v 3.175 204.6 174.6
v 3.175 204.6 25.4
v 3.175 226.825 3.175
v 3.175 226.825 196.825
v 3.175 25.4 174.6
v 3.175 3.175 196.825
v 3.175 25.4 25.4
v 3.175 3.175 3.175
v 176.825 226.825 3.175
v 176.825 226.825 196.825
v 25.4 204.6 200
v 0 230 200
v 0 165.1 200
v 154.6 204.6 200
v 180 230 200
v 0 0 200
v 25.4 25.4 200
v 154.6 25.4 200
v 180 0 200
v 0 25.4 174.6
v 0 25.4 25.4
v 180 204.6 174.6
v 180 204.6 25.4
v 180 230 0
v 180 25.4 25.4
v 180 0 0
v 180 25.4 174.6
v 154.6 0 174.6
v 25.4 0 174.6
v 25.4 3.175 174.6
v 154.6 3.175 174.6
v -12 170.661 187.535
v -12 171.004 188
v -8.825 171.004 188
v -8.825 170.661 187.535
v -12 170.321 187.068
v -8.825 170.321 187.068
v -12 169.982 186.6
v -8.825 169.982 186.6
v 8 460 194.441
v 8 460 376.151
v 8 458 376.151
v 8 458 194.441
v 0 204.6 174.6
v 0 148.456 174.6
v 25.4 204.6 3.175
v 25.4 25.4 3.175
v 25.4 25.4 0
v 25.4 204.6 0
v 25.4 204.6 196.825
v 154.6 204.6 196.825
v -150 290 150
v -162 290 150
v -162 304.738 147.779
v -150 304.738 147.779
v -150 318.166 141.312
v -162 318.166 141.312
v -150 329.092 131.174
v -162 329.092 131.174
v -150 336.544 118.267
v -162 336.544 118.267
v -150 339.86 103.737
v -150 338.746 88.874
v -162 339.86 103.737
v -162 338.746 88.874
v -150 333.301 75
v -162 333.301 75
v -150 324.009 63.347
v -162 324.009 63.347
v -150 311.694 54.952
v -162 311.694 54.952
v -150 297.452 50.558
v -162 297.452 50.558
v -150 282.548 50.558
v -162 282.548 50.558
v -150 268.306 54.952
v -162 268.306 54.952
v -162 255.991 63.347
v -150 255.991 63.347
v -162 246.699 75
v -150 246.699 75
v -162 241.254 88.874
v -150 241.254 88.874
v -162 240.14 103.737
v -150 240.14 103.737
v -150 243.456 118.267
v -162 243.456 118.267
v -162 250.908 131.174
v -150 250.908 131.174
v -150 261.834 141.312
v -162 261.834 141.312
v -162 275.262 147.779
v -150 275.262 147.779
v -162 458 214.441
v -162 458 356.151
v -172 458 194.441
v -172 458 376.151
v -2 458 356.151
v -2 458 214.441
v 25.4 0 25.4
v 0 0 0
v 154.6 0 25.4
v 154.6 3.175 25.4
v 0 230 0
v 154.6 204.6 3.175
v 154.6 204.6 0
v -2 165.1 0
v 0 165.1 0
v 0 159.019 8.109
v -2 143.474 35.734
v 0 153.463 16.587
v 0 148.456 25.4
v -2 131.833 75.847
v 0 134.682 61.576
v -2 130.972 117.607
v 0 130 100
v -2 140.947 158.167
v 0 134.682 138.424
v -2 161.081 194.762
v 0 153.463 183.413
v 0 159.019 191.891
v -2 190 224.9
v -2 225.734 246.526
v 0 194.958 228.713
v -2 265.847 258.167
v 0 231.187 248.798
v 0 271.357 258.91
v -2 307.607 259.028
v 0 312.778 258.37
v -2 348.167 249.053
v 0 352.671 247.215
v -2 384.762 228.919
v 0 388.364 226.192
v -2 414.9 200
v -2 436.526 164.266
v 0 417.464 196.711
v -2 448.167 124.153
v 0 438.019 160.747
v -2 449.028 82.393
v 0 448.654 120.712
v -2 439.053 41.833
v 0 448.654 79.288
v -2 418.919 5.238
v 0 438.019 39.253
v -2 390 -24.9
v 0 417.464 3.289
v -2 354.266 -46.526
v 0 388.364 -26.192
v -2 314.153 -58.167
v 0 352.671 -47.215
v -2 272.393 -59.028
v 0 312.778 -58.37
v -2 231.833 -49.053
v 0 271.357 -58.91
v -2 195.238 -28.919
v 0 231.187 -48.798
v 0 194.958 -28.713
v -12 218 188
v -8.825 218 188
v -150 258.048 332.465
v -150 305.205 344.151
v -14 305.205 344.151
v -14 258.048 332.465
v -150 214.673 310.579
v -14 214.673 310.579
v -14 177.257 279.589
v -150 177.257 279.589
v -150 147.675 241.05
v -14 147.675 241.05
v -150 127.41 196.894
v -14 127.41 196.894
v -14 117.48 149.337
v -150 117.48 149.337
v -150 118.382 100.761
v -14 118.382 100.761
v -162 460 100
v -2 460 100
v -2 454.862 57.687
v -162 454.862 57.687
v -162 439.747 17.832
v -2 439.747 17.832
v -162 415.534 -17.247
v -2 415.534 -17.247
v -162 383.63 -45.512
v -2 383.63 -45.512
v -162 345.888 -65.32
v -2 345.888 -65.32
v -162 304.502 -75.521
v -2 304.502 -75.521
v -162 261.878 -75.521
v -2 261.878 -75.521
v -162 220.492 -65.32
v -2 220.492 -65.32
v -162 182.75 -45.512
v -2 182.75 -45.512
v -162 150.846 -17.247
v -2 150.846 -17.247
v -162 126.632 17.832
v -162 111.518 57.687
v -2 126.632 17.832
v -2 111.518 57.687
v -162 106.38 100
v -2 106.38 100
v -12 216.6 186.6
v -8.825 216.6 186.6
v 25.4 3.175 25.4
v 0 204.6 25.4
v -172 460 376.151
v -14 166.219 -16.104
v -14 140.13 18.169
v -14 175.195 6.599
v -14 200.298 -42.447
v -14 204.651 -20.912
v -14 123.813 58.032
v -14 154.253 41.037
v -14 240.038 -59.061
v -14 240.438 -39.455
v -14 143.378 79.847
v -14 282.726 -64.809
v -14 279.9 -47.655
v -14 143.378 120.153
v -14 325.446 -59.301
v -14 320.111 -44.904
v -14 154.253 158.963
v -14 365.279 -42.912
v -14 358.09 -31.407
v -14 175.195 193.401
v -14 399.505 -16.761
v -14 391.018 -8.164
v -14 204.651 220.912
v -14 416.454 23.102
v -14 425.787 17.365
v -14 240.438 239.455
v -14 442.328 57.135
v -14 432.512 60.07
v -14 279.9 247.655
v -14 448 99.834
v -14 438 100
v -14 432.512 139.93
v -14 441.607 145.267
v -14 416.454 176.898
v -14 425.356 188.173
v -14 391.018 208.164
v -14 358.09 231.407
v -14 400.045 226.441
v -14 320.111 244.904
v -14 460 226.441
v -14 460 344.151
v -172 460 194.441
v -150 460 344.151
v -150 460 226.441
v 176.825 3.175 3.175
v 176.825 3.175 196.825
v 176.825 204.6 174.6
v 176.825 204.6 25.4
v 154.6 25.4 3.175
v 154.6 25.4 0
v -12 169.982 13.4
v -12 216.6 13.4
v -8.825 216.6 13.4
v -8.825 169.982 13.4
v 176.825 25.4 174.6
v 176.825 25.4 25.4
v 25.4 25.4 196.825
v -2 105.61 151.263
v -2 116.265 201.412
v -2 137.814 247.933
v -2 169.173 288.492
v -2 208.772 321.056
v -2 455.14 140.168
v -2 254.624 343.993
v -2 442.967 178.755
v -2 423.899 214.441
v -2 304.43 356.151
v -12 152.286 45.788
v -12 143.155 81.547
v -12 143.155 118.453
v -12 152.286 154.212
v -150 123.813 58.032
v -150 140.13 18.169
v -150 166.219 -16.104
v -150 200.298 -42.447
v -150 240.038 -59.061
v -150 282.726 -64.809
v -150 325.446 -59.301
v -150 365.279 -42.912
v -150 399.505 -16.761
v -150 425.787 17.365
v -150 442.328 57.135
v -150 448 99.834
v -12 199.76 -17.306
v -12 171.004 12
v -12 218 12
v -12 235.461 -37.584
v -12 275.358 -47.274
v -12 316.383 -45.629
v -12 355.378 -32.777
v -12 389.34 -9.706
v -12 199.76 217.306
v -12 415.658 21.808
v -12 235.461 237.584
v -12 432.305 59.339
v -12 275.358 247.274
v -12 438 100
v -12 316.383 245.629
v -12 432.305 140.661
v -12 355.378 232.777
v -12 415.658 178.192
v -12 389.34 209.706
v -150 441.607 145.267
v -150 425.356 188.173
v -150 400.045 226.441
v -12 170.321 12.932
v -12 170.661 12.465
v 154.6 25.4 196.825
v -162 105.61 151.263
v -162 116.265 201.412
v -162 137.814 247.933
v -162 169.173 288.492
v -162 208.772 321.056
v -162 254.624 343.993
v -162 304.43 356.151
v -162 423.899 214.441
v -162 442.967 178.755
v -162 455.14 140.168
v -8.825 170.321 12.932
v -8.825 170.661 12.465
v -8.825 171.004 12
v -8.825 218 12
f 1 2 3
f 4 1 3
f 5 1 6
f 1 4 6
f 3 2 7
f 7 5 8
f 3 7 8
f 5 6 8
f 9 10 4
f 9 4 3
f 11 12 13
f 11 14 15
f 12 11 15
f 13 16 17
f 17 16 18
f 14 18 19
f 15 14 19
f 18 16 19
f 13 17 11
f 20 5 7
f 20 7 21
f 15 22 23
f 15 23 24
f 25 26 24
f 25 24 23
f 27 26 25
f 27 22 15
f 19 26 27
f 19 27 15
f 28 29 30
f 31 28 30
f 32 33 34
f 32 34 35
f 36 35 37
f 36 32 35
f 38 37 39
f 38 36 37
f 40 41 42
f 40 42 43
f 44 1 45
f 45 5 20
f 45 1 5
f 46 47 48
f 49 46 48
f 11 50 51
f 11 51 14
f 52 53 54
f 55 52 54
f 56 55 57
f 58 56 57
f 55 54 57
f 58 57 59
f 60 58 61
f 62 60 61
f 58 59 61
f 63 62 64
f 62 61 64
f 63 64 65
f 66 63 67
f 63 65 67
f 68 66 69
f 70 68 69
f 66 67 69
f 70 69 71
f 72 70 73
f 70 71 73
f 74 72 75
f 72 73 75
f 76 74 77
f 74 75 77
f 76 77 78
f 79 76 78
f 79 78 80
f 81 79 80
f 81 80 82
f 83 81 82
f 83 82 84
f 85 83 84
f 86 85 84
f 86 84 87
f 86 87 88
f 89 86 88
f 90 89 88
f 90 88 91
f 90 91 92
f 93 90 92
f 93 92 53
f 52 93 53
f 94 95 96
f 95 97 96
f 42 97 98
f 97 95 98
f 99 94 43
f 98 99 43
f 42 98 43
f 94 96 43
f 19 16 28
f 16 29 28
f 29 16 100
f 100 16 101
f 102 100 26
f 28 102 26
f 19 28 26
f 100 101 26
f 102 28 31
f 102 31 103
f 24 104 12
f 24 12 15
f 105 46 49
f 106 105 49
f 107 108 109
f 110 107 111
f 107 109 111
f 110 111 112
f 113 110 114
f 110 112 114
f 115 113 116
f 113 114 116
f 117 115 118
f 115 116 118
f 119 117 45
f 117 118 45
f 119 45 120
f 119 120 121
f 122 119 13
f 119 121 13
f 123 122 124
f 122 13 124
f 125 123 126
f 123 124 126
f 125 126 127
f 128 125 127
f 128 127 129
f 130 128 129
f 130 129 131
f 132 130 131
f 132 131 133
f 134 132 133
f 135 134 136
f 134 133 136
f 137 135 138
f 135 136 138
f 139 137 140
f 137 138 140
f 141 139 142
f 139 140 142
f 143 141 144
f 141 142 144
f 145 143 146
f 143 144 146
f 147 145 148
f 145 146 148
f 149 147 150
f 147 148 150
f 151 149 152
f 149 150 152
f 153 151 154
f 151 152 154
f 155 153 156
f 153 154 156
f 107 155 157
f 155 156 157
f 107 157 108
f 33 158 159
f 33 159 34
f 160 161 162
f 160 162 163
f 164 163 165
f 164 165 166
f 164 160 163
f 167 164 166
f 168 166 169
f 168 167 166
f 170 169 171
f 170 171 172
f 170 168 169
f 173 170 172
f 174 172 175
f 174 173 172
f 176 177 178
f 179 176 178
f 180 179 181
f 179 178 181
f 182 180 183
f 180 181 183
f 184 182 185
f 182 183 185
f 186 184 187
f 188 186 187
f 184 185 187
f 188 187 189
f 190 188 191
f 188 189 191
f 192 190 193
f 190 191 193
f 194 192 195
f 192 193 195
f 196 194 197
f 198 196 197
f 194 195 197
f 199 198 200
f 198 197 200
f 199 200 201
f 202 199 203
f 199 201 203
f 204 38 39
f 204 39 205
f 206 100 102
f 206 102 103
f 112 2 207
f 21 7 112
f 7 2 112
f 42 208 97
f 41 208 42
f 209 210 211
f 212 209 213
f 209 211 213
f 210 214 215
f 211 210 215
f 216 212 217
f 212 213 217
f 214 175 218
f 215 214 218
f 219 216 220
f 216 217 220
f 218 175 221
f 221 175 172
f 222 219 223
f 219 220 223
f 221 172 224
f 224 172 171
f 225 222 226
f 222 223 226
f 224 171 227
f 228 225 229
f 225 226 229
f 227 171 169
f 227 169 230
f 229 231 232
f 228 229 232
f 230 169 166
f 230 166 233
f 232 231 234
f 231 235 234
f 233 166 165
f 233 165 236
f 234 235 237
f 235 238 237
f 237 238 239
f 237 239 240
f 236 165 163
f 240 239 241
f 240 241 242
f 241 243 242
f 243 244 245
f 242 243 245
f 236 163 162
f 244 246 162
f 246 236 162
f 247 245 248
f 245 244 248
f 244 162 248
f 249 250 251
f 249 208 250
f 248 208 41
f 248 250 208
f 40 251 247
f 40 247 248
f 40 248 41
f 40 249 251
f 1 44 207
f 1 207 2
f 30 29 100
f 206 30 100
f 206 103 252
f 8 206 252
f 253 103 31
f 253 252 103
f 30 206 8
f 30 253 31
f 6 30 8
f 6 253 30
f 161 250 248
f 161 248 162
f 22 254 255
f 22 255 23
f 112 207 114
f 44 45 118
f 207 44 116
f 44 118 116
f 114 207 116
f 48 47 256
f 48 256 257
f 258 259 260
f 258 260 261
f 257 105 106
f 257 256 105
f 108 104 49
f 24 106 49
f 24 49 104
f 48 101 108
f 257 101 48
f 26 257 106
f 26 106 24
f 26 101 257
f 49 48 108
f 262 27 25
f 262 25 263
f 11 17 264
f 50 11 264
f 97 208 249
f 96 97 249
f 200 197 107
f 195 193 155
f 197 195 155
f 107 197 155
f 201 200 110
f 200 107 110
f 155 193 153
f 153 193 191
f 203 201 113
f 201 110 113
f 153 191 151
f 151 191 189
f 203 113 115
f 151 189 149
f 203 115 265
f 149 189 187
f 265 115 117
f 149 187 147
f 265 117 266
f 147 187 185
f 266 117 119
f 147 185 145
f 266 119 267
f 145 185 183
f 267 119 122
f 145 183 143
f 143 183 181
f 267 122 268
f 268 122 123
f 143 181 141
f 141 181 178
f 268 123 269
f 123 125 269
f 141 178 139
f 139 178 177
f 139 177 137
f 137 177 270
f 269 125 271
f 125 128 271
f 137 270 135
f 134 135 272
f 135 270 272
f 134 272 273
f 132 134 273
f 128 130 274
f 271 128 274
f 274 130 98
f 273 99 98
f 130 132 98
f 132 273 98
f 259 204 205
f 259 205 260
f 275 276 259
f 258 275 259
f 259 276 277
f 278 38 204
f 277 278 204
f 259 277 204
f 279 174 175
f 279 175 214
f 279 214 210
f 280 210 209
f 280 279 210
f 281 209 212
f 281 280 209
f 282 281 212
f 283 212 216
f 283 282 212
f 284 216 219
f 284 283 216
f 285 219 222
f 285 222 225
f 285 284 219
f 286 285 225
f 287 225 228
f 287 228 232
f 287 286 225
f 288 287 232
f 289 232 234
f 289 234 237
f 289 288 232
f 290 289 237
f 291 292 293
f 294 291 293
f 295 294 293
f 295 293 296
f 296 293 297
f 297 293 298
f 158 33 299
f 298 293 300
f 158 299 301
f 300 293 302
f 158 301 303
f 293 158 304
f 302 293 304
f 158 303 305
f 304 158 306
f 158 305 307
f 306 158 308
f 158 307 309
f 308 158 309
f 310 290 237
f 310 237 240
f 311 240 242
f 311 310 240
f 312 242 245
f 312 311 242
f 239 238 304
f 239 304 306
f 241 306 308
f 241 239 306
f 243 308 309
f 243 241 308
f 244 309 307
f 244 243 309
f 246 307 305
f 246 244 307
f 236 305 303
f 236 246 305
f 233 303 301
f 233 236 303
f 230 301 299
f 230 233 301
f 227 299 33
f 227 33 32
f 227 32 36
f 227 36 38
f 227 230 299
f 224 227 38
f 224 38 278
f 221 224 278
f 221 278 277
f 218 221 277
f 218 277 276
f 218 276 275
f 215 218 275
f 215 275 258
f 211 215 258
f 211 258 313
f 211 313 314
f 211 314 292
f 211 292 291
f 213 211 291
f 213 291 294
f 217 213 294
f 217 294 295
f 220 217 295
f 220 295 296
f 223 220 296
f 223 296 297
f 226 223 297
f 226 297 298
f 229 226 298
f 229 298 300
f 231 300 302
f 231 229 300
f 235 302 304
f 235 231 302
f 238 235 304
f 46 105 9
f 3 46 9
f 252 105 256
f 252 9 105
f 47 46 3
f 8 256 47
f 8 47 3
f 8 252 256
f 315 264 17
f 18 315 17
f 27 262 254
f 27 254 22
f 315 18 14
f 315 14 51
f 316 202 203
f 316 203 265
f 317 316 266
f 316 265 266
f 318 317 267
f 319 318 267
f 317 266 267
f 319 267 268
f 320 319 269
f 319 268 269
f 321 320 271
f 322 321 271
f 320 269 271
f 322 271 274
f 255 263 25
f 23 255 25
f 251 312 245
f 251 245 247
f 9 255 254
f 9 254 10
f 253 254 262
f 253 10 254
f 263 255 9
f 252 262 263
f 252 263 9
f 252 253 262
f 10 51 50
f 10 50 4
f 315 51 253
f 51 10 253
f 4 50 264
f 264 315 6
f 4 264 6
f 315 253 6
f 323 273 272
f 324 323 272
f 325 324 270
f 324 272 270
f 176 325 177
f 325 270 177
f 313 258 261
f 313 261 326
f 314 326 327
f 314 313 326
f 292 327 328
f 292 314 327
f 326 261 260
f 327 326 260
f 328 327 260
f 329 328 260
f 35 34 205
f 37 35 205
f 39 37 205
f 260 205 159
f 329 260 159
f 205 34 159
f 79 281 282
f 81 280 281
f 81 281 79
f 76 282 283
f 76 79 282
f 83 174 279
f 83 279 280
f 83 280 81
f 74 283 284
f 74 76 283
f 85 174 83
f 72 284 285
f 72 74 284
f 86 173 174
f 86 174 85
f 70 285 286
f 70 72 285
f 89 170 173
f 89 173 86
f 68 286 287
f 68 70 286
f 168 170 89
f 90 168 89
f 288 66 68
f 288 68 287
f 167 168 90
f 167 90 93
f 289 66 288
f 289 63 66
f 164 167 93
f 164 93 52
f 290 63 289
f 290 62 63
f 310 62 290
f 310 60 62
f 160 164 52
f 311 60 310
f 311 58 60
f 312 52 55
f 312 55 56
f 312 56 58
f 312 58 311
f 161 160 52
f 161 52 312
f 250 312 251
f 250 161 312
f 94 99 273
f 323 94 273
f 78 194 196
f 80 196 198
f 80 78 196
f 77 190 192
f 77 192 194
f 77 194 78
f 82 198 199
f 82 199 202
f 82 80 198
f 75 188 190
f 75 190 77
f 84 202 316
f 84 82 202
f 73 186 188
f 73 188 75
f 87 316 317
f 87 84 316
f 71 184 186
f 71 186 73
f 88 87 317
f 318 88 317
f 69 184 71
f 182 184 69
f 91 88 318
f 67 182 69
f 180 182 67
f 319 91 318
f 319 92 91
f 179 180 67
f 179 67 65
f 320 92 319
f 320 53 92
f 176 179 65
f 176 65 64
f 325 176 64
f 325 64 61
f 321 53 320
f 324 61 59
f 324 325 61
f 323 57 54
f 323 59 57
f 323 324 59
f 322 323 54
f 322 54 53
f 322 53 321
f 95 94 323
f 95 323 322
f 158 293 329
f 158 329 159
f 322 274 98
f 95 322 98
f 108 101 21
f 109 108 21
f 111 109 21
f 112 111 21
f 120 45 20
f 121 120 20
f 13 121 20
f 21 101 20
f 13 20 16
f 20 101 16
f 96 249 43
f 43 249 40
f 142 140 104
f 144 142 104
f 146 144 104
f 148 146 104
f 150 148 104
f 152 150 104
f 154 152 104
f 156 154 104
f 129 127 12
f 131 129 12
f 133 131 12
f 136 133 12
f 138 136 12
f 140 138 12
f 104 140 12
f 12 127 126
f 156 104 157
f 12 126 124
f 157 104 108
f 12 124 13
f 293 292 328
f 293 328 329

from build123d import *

# Parameters (mm, degrees)
SALIENTE_EXTRUIR1_DEPTH   = 230
SALIENTE_EXTRUIR1_2_DEPTH = 230
SALIENTE_EXTRUIR1_3_DEPTH = 230
SALIENTE_EXTRUIR1_4_DEPTH = 230
SALIENTE_EXTRUIR2_REACH   = 355.977
SALIENTE_EXTRUIR3_DEPTH   = 180
CROQUIS4_W                = 149.2
CROQUIS4_H                = 3.175
SALIENTE_EXTRUIR4_DEPTH   = 154.6
CROQUIS5_R                = 160
SALIENTE_EXTRUIR5_DEPTH   = 2
SALIENTE_EXTRUIR6_DEPTH   = 160
CROQUIS7_W                = 180
CROQUIS7_H                = 181.710341205
SALIENTE_EXTRUIR7_DEPTH   = 2
VACIADO1_START            = -150
VACIADO1_DEPTH            = 136
VACIADO1_START_2          = -14
VACIADO1_2_OUTLINE_R      = 148
VACIADO1_2_DEPTH          = 2
VACIADO1_START_3          = -12
VACIADO1_3_DEPTH          = 3.175
CROQUIS8_R                = 50
CORTAR_EXTRUIR1_DEPTH     = 14


# Read off the part's stored shape, not the designer's step: Vaciado1
with BuildPart() as part:
    # Croquis1 → Saliente-Extruir1 (new body)
    with BuildSketch(Plane(origin=(0, 0, 0), x_dir=(1, 0, 0), z_dir=(0, 1, 0))):
        Polygon((0, 0), (25.4, 0), (25.4, -3.175), (3.175, -3.175), (3.175, -25.4), (0, -25.4), align=None)
    extrude(amount=SALIENTE_EXTRUIR1_DEPTH)

    # Saliente-Extruir2: up to this face of the body (flat: up to its plane)
    saliente_extruir2_end = Plane(part.part.faces().sort_by_distance((12.7, 115, 0))[0])
    # Croquis2 → Saliente-Extruir2 (add, up to the picked face)
    with BuildSketch(Plane.XY.offset(200), mode=Mode.PRIVATE) as saliente_extruir2_sk1:
        Polygon((25.4, 230), (0, 230), (0, 204.6), (3.175, 204.6), (3.175, 226.825), (25.4, 226.825), align=None)
    saliente_extruir2_tool1 = split(extrude(saliente_extruir2_sk1.sketch, amount=-SALIENTE_EXTRUIR2_REACH, mode=Mode.PRIVATE), bisect_by=saliente_extruir2_end, keep=Keep.BOTH, mode=Mode.PRIVATE)
    # Croquis2 → Saliente-Extruir2 (add, up to the picked face)
    with BuildSketch(Plane.XY.offset(200), mode=Mode.PRIVATE) as saliente_extruir2_sk2:
        Polygon((176.825, 204.6), (180, 204.6), (180, 230), (154.6, 230), (154.6, 226.825), (176.825, 226.825), align=None)
    saliente_extruir2_tool2 = split(extrude(saliente_extruir2_sk2.sketch, amount=-SALIENTE_EXTRUIR2_REACH, mode=Mode.PRIVATE), bisect_by=saliente_extruir2_end, keep=Keep.BOTH, mode=Mode.PRIVATE)
    # Croquis2 → Saliente-Extruir2 (add, up to the picked face)
    with BuildSketch(Plane.XY.offset(200), mode=Mode.PRIVATE) as saliente_extruir2_sk3:
        Polygon((154.6, 0), (180, 0), (180, 25.4), (176.825, 25.4), (176.825, 3.175), (154.6, 3.175), align=None)
    saliente_extruir2_tool3 = split(extrude(saliente_extruir2_sk3.sketch, amount=-SALIENTE_EXTRUIR2_REACH, mode=Mode.PRIVATE), bisect_by=saliente_extruir2_end, keep=Keep.BOTH, mode=Mode.PRIVATE)
    # Croquis2 → Saliente-Extruir2 (add, up to the picked face)
    with BuildSketch(Plane.XY.offset(200), mode=Mode.PRIVATE) as saliente_extruir2_sk4:
        Polygon((3.175, 25.4), (0, 25.4), (0, 0), (25.4, 0), (25.4, 3.175), (3.175, 3.175), align=None)
    saliente_extruir2_tool4 = split(extrude(saliente_extruir2_sk4.sketch, amount=-SALIENTE_EXTRUIR2_REACH, mode=Mode.PRIVATE), bisect_by=saliente_extruir2_end, keep=Keep.BOTH, mode=Mode.PRIVATE)


with BuildPart() as body_2:
    # Croquis1 → Saliente-Extruir1 2 (new body)
    with BuildSketch(Plane(origin=(0, 0, 0), x_dir=(1, 0, 0), z_dir=(0, 1, 0))):
        Polygon((176.825, -25.4), (180, -25.4), (180, 0), (154.6, 0), (154.6, -3.175), (176.825, -3.175), align=None)
    extrude(amount=SALIENTE_EXTRUIR1_2_DEPTH)


with BuildPart() as body_3:
    # Croquis1 → Saliente-Extruir1 3 (new body)
    with BuildSketch(Plane(origin=(0, 0, 0), x_dir=(1, 0, 0), z_dir=(0, 1, 0))):
        Polygon((180, -200), (154.6, -200), (154.6, -196.825), (176.825, -196.825), (176.825, -174.6), (180, -174.6), align=None)
    extrude(amount=SALIENTE_EXTRUIR1_3_DEPTH)


with BuildPart() as body_4:
    # Croquis1 → Saliente-Extruir1 4 (new body)
    with BuildSketch(Plane(origin=(0, 0, 0), x_dir=(1, 0, 0), z_dir=(0, 1, 0))):
        Polygon((3.175, -174.6), (0, -174.6), (0, -200), (25.4, -200), (25.4, -196.825), (3.175, -196.825), align=None)
    extrude(amount=SALIENTE_EXTRUIR1_4_DEPTH)


with BuildPart() as part_1:
    add(part.part)

    add(body_2.part)  # Saliente-Extruir2 merges body 2

    add(body_3.part)  # Saliente-Extruir2 merges body 3

    add(body_4.part)  # Saliente-Extruir2 merges body 4
    add(saliente_extruir2_tool1.solids().sort_by(Axis((12.7, 229.64079, 200), (0, 0, -1)))[0])
    add(saliente_extruir2_tool2.solids().sort_by(Axis((178.4125, 204.95921, 200), (0, 0, -1)))[0])
    add(saliente_extruir2_tool3.solids().sort_by(Axis((167.3, 0.35921, 200), (0, 0, -1)))[0])
    add(saliente_extruir2_tool4.solids().sort_by(Axis((1.5875, 25.04079, 200), (0, 0, -1)))[0])

    # Croquis3 → Saliente-Extruir3 (add)
    with BuildSketch(Plane.ZY):
        Polygon((0, 0), (25.4, 0), (25.4, 3.175), (3.175, 3.175), (3.175, 25.4), (0, 25.4), align=None)
        Polygon((196.825, 25.4), (200, 25.4), (200, 0), (174.6, 0), (174.6, 3.175), (196.825, 3.175), align=None)
        Polygon((200, 230), (174.6, 230), (174.6, 226.825), (196.825, 226.825), (196.825, 204.6), (200, 204.6), align=None)
        Polygon((3.175, 204.6), (0, 204.6), (0, 230), (25.4, 230), (25.4, 226.825), (3.175, 226.825), align=None)
    extrude(amount=-SALIENTE_EXTRUIR3_DEPTH)

    # Croquis4 → Saliente-Extruir4 (add)
    with BuildSketch(Plane(origin=(180, 0, 0), x_dir=(0, 0, -1), z_dir=(1, 0, 0))):
        with Locations((-100, 228.4125)):
            Rectangle(CROQUIS4_W, CROQUIS4_H)
    extrude(amount=-SALIENTE_EXTRUIR4_DEPTH)

    # Croquis5 → Saliente-Extruir5 (add)
    with BuildSketch(Plane.ZY):
        with Locations(Location((100, 290, 0), (0, 0, 231.317812547))):
            Circle(CROQUIS5_R)
    extrude(amount=SALIENTE_EXTRUIR5_DEPTH)

    # Croquis6 → Saliente-Extruir6 (add)
    with BuildSketch(Plane.ZY.offset(2)):
        with BuildLine():
            Line((356.150943647, 460), (214.440602442, 460))
            Line((214.440602442, 460), (214.440602442, 423.899354359))
            ThreePointArc((214.440602442, 423.899354359), (159.743155313, 449.947233376), (100, 460))
            ThreePointArc((100, 460), (-76.81003198, 283.18996802), (100, 106.379936039))
            ThreePointArc((100, 106.379936039), (269.093013095, 152.354443037), (356.150943647, 304.430144907))
            Line((356.150943647, 304.430144907), (356.150943647, 460))
        make_face()
    extrude(amount=SALIENTE_EXTRUIR6_DEPTH)

    # Croquis7 → Saliente-Extruir7 (add)
    with BuildSketch(Plane(origin=(0, 460, 0), x_dir=(1, 0, 0), z_dir=(0, 1, 0))):
        with Locations((-82, -285.295773045)):
            Rectangle(CROQUIS7_W, CROQUIS7_H)
    extrude(amount=-SALIENTE_EXTRUIR7_DEPTH)

    # Vaciado1 outline → Vaciado1 (cut)
    with BuildSketch(Plane.YZ.offset(VACIADO1_START)):
        with BuildLine():
            Line((460, 344.150943647), (305.204872044, 344.150943647))
            ThreePointArc((305.204872044, 344.150943647), (161.38343221, 261.150196169), (118.381694611, 100.761352414))
            ThreePointArc((118.381694611, 100.761352414), (282.726065317, -64.809379089), (447.999915945, 99.833548521))
            ThreePointArc((447.999915945, 99.833548521), (434.67491503, 167.171792789), (400.045404599, 226.440602442))
            Line((400.045404599, 226.440602442), (460, 226.440602442))
            Line((460, 226.440602442), (460, 344.150943647))
        make_face()
    extrude(amount=VACIADO1_DEPTH, mode=Mode.SUBTRACT)

    # Vaciado1 2 outline → Vaciado1 2 (cut)
    with BuildSketch(Plane.YZ.offset(VACIADO1_START_2)):
        with Locations((290, 100)):
            Circle(VACIADO1_2_OUTLINE_R)
    extrude(amount=VACIADO1_2_DEPTH, mode=Mode.SUBTRACT)

    # Vaciado1 3 outline → Vaciado1 3 (cut)
    with BuildSketch(Plane.YZ.offset(VACIADO1_START_3)):
        with BuildLine():
            Line((169.981501426, 186.6), (216.6, 186.6))
            Line((216.6, 186.6), (216.6, 13.4))
            Line((216.6, 13.4), (169.981501426, 13.4))
            ThreePointArc((169.981501426, 13.4), (170.490801521, 12.698502424), (171.004201755, 12))
            Line((171.004201755, 12), (218, 12))
            Line((218, 12), (218, 188))
            Line((218, 188), (171.004201755, 188))
            ThreePointArc((171.004201755, 188), (170.490801521, 187.301497576), (169.981501426, 186.6))
        make_face()
    extrude(amount=VACIADO1_3_DEPTH, mode=Mode.SUBTRACT)

    # Croquis8 → Cortar-Extruir1 (cut)
    with BuildSketch(Plane.ZY.offset(162)):
        with Locations((100, 290)):
            Circle(CROQUIS8_R)
    extrude(amount=-CORTAR_EXTRUIR1_DEPTH, mode=Mode.SUBTRACT)


solid = part_1.part
